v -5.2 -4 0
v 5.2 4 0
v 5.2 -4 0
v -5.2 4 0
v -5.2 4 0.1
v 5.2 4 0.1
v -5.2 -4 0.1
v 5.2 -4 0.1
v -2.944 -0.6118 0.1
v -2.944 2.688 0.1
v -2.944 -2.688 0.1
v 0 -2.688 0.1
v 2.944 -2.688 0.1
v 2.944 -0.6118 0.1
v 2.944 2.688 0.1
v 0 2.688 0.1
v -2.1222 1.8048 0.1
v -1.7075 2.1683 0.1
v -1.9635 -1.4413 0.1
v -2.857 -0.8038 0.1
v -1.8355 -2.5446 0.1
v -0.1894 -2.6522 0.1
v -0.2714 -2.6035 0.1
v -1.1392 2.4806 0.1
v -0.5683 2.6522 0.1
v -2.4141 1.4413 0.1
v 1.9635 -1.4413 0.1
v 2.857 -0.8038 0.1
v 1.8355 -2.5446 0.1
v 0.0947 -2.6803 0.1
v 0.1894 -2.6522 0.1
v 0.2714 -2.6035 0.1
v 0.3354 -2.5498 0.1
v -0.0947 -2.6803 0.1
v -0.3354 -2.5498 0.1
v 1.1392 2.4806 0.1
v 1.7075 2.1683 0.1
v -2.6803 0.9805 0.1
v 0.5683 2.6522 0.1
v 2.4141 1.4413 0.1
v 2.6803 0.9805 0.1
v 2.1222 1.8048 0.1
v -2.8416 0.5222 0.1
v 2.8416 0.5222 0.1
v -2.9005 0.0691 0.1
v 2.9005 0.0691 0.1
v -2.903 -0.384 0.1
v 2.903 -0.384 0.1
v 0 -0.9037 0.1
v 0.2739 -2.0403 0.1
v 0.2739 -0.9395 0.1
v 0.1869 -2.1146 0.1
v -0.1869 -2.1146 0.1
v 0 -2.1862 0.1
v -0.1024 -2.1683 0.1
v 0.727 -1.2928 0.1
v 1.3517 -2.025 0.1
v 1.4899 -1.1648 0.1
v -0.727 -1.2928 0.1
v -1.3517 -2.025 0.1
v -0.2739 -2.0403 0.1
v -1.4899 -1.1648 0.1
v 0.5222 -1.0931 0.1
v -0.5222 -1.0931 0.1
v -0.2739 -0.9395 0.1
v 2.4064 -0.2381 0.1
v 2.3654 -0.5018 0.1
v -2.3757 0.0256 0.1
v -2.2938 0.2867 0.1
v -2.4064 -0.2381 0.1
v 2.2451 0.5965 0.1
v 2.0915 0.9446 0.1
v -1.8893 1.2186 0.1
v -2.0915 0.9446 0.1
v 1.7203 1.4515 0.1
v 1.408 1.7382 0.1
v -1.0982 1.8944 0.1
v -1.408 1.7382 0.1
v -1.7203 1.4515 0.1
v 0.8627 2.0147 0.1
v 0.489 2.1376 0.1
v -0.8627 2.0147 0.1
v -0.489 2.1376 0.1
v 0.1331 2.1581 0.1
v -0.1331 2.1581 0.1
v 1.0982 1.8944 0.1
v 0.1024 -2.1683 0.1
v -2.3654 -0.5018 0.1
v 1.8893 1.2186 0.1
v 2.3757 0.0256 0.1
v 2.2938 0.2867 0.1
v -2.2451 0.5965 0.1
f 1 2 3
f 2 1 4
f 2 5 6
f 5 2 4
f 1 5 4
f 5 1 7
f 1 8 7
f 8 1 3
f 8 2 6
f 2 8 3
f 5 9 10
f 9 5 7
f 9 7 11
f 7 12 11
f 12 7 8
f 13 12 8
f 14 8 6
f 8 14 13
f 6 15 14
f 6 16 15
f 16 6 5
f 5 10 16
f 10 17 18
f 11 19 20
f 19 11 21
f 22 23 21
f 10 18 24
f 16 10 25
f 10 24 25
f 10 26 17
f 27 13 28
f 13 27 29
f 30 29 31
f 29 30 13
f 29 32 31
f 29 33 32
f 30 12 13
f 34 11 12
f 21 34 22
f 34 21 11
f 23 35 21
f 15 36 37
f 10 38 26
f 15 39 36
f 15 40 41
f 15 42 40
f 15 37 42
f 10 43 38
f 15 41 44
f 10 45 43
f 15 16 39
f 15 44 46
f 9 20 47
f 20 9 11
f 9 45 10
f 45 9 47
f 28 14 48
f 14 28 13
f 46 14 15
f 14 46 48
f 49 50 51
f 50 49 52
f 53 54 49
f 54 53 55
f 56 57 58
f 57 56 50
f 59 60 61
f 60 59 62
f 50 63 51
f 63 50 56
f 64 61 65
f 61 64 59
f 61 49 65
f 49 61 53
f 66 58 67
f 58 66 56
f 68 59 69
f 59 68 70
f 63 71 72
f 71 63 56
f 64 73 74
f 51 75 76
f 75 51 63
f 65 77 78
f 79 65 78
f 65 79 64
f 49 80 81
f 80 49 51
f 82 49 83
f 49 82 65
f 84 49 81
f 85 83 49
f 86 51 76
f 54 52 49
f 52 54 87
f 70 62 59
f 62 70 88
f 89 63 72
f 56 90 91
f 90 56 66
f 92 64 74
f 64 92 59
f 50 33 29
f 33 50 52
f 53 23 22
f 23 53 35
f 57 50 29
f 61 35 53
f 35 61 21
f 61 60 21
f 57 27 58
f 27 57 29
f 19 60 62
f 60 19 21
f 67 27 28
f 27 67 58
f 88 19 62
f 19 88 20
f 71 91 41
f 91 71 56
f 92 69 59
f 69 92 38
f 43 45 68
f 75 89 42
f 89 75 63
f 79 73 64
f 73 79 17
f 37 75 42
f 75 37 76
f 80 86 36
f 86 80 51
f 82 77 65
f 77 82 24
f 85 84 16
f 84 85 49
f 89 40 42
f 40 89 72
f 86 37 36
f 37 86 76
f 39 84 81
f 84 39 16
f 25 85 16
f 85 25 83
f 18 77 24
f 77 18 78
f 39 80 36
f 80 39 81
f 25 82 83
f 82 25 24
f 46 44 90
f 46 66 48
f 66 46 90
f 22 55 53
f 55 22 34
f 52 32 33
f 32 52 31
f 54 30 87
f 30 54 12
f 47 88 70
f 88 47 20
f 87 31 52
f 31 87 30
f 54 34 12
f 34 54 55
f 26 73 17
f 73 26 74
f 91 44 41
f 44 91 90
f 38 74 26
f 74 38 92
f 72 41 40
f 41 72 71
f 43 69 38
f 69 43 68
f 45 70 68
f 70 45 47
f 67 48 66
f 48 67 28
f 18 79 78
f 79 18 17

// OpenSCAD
// file: ../p/logo-shell-1971-outerbox.scad
use <../lib.scad>
function ldraw_lib__logo_shell_1971_outerbox() = [
// 0 Logo Shell 1971 Outerbox
// 0 Name: logo-shell-1971-outerbox.dat
// 0 Author: Vincent Messenet [Cheenzo]
// 0 !LDRAW_ORG Primitive UPDATE 2023-04
// 0 !LICENSE Licensed under CC BY 4.0 : see CAreadme.txt
// 
// 0 BFC CERTIFY CCW
  [0,"BFC","CERTIFY"],
  [0,"BFC","CCW"],
// 
// 0 !HISTORY 2023-06-28 [Cheenzo] Created based on 3004s60 by J. C. Tchang [tchang]
// 0 !HISTORY 2023-08-25 [OrionP] Official Update 2023-04
// 
// 
// 0 // Shell Logo 1971
// 0 // Size: x = -11.5 to 11.5 y = -10.5 to 10.5 z = 0
// 
// 3 16 -11.5 0 10.5 -8.29 0 7.05 -6.67 0 8.47
  [3,16,-11.5,0,10.5,-8.29,0,7.05,-6.67,0,8.47],
// 4 16 -7.17 0 -9.94 -7.67 0 -5.63 -11.16 0 -3.14 -11.5 0 -10.5
  [4,16,-7.17,0,-9.94,-7.67,0,-5.63,-11.16,0,-3.14,-11.5,0,-10.5],
// 3 16 -.74 0 -10.36 -1.06 0 -10.17 -7.17 0 -9.94
  [3,16,-.74,0,-10.36,-1.06,0,-10.17,-7.17,0,-9.94],
// 3 16 -11.5 0 10.5 -6.67 0 8.47 -4.45 0 9.69
  [3,16,-11.5,0,10.5,-6.67,0,8.47,-4.45,0,9.69],
// 3 16 0 0 10.5 -11.5 0 10.5 -2.22 0 10.36
  [3,16,0,0,10.5,-11.5,0,10.5,-2.22,0,10.36],
// 3 16 -11.5 0 10.5 -4.45 0 9.69 -2.22 0 10.36
  [3,16,-11.5,0,10.5,-4.45,0,9.69,-2.22,0,10.36],
// 3 16 -11.5 0 10.5 -9.43 0 5.63 -8.29 0 7.05
  [3,16,-11.5,0,10.5,-9.43,0,5.63,-8.29,0,7.05],
// 4 16 11.16 0 -3.14 7.67 0 -5.63 7.17 0 -9.94 11.5 0 -10.5
  [4,16,11.16,0,-3.14,7.67,0,-5.63,7.17,0,-9.94,11.5,0,-10.5],
// 4 16 11.5 0 -10.5 7.17 0 -9.94 .74 0 -10.36 .37 0 -10.47
  [4,16,11.5,0,-10.5,7.17,0,-9.94,.74,0,-10.36,.37,0,-10.47],
// 3 16 7.17 0 -9.94 1.06 0 -10.17 .74 0 -10.36
  [3,16,7.17,0,-9.94,1.06,0,-10.17,.74,0,-10.36],
// 3 16 7.17 0 -9.94 1.31 0 -9.96 1.06 0 -10.17
  [3,16,7.17,0,-9.94,1.31,0,-9.96,1.06,0,-10.17],
// 3 16 .37 0 -10.47 0 0 -10.5 11.5 0 -10.5
  [3,16,.37,0,-10.47,0,0,-10.5,11.5,0,-10.5],
// 3 16 -.37 0 -10.47 -11.5 0 -10.5 0 0 -10.5
  [3,16,-.37,0,-10.47,-11.5,0,-10.5,0,0,-10.5],
// 4 16 -.37 0 -10.47 -.74 0 -10.36 -7.17 0 -9.94 -11.5 0 -10.5
  [4,16,-.37,0,-10.47,-.74,0,-10.36,-7.17,0,-9.94,-11.5,0,-10.5],
// 3 16 -1.06 0 -10.17 -1.31 0 -9.96 -7.17 0 -9.94
  [3,16,-1.06,0,-10.17,-1.31,0,-9.96,-7.17,0,-9.94],
// 3 16 11.5 0 10.5 4.45 0 9.69 6.67 0 8.47
  [3,16,11.5,0,10.5,4.45,0,9.69,6.67,0,8.47],
// 3 16 -11.5 0 10.5 -10.47 0 3.83 -9.43 0 5.63
  [3,16,-11.5,0,10.5,-10.47,0,3.83,-9.43,0,5.63],
// 3 16 11.5 0 10.5 2.22 0 10.36 4.45 0 9.69
  [3,16,11.5,0,10.5,2.22,0,10.36,4.45,0,9.69],
// 3 16 11.5 0 10.5 9.43 0 5.63 10.47 0 3.83
  [3,16,11.5,0,10.5,9.43,0,5.63,10.47,0,3.83],
// 3 16 11.5 0 10.5 8.29 0 7.05 9.43 0 5.63
  [3,16,11.5,0,10.5,8.29,0,7.05,9.43,0,5.63],
// 3 16 11.5 0 10.5 6.67 0 8.47 8.29 0 7.05
  [3,16,11.5,0,10.5,6.67,0,8.47,8.29,0,7.05],
// 3 16 -11.5 0 10.5 -11.1 0 2.04 -10.47 0 3.83
  [3,16,-11.5,0,10.5,-11.1,0,2.04,-10.47,0,3.83],
// 3 16 11.5 0 10.5 10.47 0 3.83 11.1 0 2.04
  [3,16,11.5,0,10.5,10.47,0,3.83,11.1,0,2.04],
// 3 16 -11.5 0 10.5 -11.33 0 .27 -11.1 0 2.04
  [3,16,-11.5,0,10.5,-11.33,0,.27,-11.1,0,2.04],
// 3 16 11.5 0 10.5 0 0 10.5 2.22 0 10.36
  [3,16,11.5,0,10.5,0,0,10.5,2.22,0,10.36],
// 3 16 11.5 0 10.5 11.1 0 2.04 11.33 0 .27
  [3,16,11.5,0,10.5,11.1,0,2.04,11.33,0,.27],
// 4 16 -11.16 0 -3.14 -11.34 0 -1.5 -11.5 0 -2.39 -11.5 0 -10.5
  [4,16,-11.16,0,-3.14,-11.34,0,-1.5,-11.5,0,-2.39,-11.5,0,-10.5],
// 4 16 -11.34 0 -1.5 -11.33 0 .27 -11.5 0 10.5 -11.5 0 -2.39
  [4,16,-11.34,0,-1.5,-11.33,0,.27,-11.5,0,10.5,-11.5,0,-2.39],
// 4 16 11.5 0 -2.39 11.34 0 -1.5 11.16 0 -3.14 11.5 0 -10.5
  [4,16,11.5,0,-2.39,11.34,0,-1.5,11.16,0,-3.14,11.5,0,-10.5],
// 4 16 11.5 0 -2.39 11.5 0 10.5 11.33 0 .27 11.34 0 -1.5
  [4,16,11.5,0,-2.39,11.5,0,10.5,11.33,0,.27,11.34,0,-1.5],
];
module ldraw_lib__logo_shell_1971_outerbox(step=0, col=false, unit=2/5, alt=false, line=0.2, solid=!$preview)
    makepoly(ldraw_lib__logo_shell_1971_outerbox(), step=step, col=col, unit=unit, alt=alt, line=line, solid=solid);
ldraw_lib__logo_shell_1971_outerbox(line=0.2);
// file: ../p/box5-12.scad
use <../lib.scad>
function ldraw_lib__box5_12() = [
// 0 Box with 5 Faces without Any Edges
// 0 Name: box5-12.dat
// 0 Author: Chris Dee [cwdee]
// 0 !LDRAW_ORG Primitive UPDATE 2009-02
// 0 !LICENSE Licensed under CC BY 4.0 : see CAreadme.txt
// 
// 0 BFC CERTIFY CCW
  [0,"BFC","CERTIFY"],
  [0,"BFC","CCW"],
// 
// 0 !HISTORY 2009-09-03 [PTadmin] Official Update 2009-02
// 
// 
// 4 16 1 1 1 1 1 -1 -1 1 -1 -1 1 1
  [4,16,1,1,1,1,1,-1,-1,1,-1,-1,1,1],
// 4 16 -1 0 1 1 0 1 1 1 1 -1 1 1
  [4,16,-1,0,1,1,0,1,1,1,1,-1,1,1],
// 4 16 -1 0 -1 -1 0 1 -1 1 1 -1 1 -1
  [4,16,-1,0,-1,-1,0,1,-1,1,1,-1,1,-1],
// 4 16 1 0 -1 -1 0 -1 -1 1 -1 1 1 -1
  [4,16,1,0,-1,-1,0,-1,-1,1,-1,1,1,-1],
// 4 16 1 0 1 1 0 -1 1 1 -1 1 1 1
  [4,16,1,0,1,1,0,-1,1,1,-1,1,1,1],
// 0
];
module ldraw_lib__box5_12(step=0, col=false, unit=2/5, alt=false, line=0.2, solid=!$preview)
    makepoly(ldraw_lib__box5_12(), step=step, col=col, unit=unit, alt=alt, line=line, solid=solid);
ldraw_lib__box5_12(line=0.2);
// main file
use <../lib.scad>
use <../p/box5-12.scad>
use <../p/logo-shell-1971-outerbox.scad>
use <../p/logo-shell-1971.scad>
function ldraw_lib__196945x() = [
// 0 Sticker  1.0 x  1.3 with Shell Logo 1971 on Transparent Background
// 0 Name: 196945x.dat
// 0 Author: Vincent Messenet [Cheenzo]
// 0 !LDRAW_ORG Part UPDATE 2023-04
// 0 !LICENSE Licensed under CC BY 4.0 : see CAreadme.txt
// 
// 0 BFC CERTIFY CCW
  [0,"BFC","CERTIFY"],
  [0,"BFC","CCW"],
// 
// 0 !KEYWORDS Bricklink 7735stk01, Brickowl 938798, Rebrickable 196945, Set 7735
// 
// 0 !HISTORY 2023-08-25 [OrionP] Official Update 2023-04
// 
// 
// 1 16 0 -.25 0 13 0 0 0 .25 0 0 0 10 box5-12.dat
  [1,16,0,-.25,0,13,0,0,0,.25,0,0,0,10, ldraw_lib__box5_12()],
// 4 16 -7.36 -.25 -1.5296 -7.36 -.25 6.72 -13 -.25 10 -13 -.25 -10
  [4,16,-7.36,-.25,-1.5296,-7.36,-.25,6.72,-13,-.25,10,-13,-.25,-10],
// 3 16 -7.36 -.25 -1.5296 -13 -.25 -10 -7.36 -.25 -6.72
  [3,16,-7.36,-.25,-1.5296,-13,-.25,-10,-7.36,-.25,-6.72],
// 4 16 0 -.25 -6.72 -7.36 -.25 -6.72 -13 -.25 -10 13 -.25 -10
  [4,16,0,-.25,-6.72,-7.36,-.25,-6.72,-13,-.25,-10,13,-.25,-10],
// 3 16 7.36 -.25 -6.72 0 -.25 -6.72 13 -.25 -10
  [3,16,7.36,-.25,-6.72,0,-.25,-6.72,13,-.25,-10],
// 4 16 7.36 -.25 -1.5296 7.36 -.25 -6.72 13 -.25 -10 13 -.25 10
  [4,16,7.36,-.25,-1.5296,7.36,-.25,-6.72,13,-.25,-10,13,-.25,10],
// 3 16 13 -.25 10 7.36 -.25 6.72 7.36 -.25 -1.5296
  [3,16,13,-.25,10,7.36,-.25,6.72,7.36,-.25,-1.5296],
// 4 16 0 -.25 6.72 7.36 -.25 6.72 13 -.25 10 -13 -.25 10
  [4,16,0,-.25,6.72,7.36,-.25,6.72,13,-.25,10,-13,-.25,10],
// 3 16 -13 -.25 10 -7.36 -.25 6.72 0 -.25 6.72
  [3,16,-13,-.25,10,-7.36,-.25,6.72,0,-.25,6.72],
// 1 16 0 -.25 0 .64 0 0 0 1 0 0 0 .64 logo-shell-1971-outerbox.dat
  [1,16,0,-.25,0,.64,0,0,0,1,0,0,0,.64, ldraw_lib__logo_shell_1971_outerbox()],
// 0 BFC NOCLIP
  [0,"BFC","NOCLIP"],
// 1 16 0 -.25 0 .64 0 0 0 1 0 0 0 .64 logo-shell-1971.dat
  [1,16,0,-.25,0,.64,0,0,0,1,0,0,0,.64, ldraw_lib__logo_shell_1971()],
];
module ldraw_lib__196945x(step=0, col=false, unit=2/5, alt=false, line=0.2, solid=!$preview)
    makepoly(ldraw_lib__196945x(), step=step, col=col, unit=unit, alt=alt, line=line, solid=solid);
ldraw_lib__196945x(line=0.2);
